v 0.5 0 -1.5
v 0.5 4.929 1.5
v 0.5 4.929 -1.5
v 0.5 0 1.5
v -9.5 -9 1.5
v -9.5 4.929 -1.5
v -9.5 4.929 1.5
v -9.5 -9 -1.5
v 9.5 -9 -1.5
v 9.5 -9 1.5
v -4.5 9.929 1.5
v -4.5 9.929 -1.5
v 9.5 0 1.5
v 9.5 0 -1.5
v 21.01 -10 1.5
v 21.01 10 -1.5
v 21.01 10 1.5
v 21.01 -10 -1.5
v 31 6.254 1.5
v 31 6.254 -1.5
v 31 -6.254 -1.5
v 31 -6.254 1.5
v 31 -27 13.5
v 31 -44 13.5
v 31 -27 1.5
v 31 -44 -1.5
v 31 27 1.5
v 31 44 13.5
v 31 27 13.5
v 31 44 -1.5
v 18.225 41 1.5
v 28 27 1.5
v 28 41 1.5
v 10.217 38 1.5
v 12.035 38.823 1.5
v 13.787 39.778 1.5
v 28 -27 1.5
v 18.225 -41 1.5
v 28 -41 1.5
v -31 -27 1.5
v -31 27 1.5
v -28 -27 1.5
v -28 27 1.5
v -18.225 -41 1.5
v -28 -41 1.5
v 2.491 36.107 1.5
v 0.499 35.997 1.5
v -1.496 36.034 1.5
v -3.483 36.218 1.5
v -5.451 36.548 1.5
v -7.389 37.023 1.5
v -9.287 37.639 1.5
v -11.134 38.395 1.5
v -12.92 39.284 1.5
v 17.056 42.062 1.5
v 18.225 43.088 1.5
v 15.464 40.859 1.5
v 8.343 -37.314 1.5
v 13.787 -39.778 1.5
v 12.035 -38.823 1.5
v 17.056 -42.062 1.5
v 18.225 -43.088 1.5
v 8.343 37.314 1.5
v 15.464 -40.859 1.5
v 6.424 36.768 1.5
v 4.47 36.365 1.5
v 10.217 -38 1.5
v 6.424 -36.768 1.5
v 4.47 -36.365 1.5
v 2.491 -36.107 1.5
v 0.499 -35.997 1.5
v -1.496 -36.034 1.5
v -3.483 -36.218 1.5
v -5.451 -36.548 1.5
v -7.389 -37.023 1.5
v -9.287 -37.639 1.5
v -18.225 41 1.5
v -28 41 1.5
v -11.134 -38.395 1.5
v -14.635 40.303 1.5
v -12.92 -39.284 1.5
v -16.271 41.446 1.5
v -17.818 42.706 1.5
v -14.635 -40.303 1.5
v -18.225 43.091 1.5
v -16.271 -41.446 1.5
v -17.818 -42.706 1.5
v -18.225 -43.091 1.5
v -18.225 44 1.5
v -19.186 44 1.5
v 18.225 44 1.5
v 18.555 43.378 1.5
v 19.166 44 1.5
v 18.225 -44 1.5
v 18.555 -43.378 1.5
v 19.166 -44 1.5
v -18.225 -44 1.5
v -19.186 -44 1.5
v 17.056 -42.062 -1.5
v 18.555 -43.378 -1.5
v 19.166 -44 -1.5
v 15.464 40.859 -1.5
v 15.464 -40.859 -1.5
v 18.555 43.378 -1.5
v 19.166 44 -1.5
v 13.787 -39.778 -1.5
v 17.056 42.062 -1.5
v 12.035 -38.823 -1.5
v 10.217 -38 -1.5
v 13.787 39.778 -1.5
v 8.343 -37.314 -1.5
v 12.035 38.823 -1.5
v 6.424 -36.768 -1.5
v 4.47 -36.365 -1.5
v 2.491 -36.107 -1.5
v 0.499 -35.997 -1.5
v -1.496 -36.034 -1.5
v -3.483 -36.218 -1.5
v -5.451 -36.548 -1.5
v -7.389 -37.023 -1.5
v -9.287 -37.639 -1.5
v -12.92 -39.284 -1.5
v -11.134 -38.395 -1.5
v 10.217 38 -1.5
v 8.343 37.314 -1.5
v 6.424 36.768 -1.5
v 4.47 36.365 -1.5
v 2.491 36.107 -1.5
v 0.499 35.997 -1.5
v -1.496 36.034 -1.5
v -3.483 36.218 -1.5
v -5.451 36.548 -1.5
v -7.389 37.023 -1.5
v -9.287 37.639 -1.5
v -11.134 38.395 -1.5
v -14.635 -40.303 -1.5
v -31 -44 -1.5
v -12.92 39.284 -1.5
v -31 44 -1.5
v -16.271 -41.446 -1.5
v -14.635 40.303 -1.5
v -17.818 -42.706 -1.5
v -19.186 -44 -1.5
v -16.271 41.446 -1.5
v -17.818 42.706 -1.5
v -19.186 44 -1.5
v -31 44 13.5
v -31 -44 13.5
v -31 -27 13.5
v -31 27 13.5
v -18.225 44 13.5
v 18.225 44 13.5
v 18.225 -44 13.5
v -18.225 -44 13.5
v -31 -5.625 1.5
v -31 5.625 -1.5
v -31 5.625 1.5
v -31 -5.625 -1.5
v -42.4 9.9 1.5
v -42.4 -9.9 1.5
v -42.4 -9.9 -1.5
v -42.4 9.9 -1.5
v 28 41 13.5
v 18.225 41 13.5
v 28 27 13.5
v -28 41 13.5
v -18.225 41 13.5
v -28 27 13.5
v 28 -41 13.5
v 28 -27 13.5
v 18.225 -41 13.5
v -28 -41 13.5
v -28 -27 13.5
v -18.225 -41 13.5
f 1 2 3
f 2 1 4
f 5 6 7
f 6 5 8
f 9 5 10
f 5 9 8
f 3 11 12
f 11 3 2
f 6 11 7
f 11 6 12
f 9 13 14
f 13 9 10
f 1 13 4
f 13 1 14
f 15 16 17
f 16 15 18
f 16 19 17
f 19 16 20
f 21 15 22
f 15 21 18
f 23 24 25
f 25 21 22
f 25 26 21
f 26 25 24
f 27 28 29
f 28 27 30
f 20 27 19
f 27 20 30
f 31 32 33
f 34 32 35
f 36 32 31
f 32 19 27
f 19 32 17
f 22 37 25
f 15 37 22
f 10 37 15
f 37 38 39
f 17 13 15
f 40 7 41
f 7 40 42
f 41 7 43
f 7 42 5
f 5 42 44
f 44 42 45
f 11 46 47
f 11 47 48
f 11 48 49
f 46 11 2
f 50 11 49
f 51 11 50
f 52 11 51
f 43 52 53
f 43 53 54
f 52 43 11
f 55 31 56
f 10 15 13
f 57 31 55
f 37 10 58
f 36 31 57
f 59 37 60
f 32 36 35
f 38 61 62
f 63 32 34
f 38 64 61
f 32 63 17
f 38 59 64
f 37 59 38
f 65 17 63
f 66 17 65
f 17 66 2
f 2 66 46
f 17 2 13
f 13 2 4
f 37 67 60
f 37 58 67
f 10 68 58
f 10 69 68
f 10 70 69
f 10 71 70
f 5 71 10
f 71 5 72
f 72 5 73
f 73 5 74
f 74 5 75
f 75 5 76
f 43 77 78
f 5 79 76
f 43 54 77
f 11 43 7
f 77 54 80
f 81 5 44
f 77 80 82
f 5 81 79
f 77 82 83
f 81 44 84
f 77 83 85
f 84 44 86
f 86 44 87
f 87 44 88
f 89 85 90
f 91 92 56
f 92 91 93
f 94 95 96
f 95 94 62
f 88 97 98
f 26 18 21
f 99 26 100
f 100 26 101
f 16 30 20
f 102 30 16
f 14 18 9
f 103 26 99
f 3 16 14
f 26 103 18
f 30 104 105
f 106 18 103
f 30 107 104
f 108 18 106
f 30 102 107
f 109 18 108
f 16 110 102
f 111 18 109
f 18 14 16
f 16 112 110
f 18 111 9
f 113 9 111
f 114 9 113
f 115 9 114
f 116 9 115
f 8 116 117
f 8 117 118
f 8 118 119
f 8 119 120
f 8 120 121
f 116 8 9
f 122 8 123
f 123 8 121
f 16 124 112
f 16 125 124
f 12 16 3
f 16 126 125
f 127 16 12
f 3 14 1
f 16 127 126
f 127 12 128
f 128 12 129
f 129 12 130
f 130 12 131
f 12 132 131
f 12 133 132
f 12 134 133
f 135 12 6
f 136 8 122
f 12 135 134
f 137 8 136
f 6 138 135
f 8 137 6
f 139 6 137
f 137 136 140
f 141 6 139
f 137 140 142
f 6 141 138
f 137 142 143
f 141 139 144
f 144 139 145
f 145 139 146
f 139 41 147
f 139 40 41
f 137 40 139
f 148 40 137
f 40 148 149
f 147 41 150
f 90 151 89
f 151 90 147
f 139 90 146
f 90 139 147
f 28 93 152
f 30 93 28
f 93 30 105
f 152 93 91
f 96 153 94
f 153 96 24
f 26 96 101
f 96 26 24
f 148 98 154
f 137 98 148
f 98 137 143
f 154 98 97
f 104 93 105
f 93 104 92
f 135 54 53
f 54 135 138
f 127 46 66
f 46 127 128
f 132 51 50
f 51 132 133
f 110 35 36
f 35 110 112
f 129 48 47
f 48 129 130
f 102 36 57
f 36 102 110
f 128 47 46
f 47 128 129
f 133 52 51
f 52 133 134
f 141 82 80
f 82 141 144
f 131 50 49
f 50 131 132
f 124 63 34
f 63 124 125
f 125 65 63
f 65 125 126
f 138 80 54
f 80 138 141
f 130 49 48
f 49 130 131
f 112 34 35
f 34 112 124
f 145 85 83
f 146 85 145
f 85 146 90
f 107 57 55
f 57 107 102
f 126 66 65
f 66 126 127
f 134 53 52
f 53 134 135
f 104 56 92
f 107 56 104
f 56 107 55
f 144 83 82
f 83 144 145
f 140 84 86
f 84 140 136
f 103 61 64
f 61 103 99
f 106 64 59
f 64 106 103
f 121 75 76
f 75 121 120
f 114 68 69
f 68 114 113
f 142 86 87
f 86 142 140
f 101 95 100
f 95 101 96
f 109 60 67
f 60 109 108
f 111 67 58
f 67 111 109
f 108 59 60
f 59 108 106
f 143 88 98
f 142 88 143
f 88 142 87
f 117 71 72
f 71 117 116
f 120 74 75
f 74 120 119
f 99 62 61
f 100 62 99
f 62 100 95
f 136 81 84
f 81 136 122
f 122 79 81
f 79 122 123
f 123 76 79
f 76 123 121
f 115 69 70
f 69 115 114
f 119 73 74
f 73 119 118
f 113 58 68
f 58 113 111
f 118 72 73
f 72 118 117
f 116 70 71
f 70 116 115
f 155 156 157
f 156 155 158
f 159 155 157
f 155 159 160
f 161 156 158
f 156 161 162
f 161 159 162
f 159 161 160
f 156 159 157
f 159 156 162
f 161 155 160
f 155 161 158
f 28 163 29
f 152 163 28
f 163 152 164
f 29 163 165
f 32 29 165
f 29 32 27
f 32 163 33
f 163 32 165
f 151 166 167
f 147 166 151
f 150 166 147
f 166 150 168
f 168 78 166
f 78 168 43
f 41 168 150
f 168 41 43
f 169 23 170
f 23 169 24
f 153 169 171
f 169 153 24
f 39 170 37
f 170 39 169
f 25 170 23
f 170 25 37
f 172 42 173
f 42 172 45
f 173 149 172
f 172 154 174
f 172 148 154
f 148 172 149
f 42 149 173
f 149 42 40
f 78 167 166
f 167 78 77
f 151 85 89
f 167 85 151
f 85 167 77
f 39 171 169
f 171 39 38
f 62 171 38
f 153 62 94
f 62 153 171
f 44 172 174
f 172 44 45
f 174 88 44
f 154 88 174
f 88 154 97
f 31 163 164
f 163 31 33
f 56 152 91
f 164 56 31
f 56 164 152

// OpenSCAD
//Settlers game card holder
// 1 to 1 copy of previous blender version but with parameters for changeing dimention

//Constants
// Card short side in mm (Default settlers card 54mm)
card_x = 54;

// Card long side in mm (Default settlers card 80mm)
card_y = 80;

show_logo = "yes"; // [yes,no]

connectors = "both";  // [both,none,female,male]

// Gap between card and the walls of the holder
card_space = 2; //original 2
wall_thickness = 3; //original 2
plate_height = 3; //original 2
wall_height = 12; //original 12
shortwall_cut = card_x/(card_y/card_x);
shortwall = (card_x-shortwall_cut)/2+wall_thickness+card_space/2;

//Connecting piece
//the "female" part is 21mm at the biggest point and 12.5mm at the smallest and 10mm deep
//the "male" part is  19.8mm at the biggest point and 10.46mm at smallest and 11.4mm long
//the odd numbers are because i used a manualy freehand modifed box with no real grid snapping, and some random scaling
// ignore variable values
female_con_x = 10+1-1;
female_con_y1 = 21+1-2;
female_con_y2 = 12.5+1-1;
male_con_x = 11.4+1-1;
male_con_y1 = 19.8+1-1;
male_con_y2 = 10.46+1-1;
angle = atan( ((female_con_y1-female_con_y2)/2) / female_con_x ); // same for both




union() {

	difference() {
		//Base plate
		cube(size = [card_x+card_space+wall_thickness*2, card_y+card_space+wall_thickness*2,plate_height], center = true);
		//Round Cut
		// was made with a cylinder with radius=32 scaled in x and y by 0.8, resulting in R=25.6 and that is aprox card_x
		translate([0,card_y/1.27,-card_x/4])
		cylinder(card_x/2, card_x/2, card_x/2, $fa=2);
		translate([0,-card_y/1.27,-card_x/4])
		cylinder(card_x/2, card_x/2, card_x/2, $fa=2);

		//Logo
		if (show_logo == "yes") {
			union() {
				translate([0, -4.5, 0])
				cube(size = [19,9,10], center = true);
				difference() {
					translate([-4.5, 0.5 ,0])
					cube(size = [10,19,10], center = true);
					translate([0.5, 12 ,0])
					rotate([0, 0, 45])
					cube(size = [10,12,11], center = true);
					translate([-9.5, 12 ,0])
					rotate([0, 0, 45])
					cube(size = [12,10,11], center = true);
				}
			}
		}

		//female con
		if (connectors == "both" || connectors == "female") {
			translate( [ (card_x/2) - female_con_x + card_space/2 + wall_thickness +0.01 , -female_con_y1/2, -plate_height ] ) //0.01 is for overlapping
			difference() {
				cube(size = [female_con_x, female_con_y1, plate_height*2], center = false);
				translate( [ 0,female_con_y1,-1 ] )
				rotate([0, 0, -angle])
				cube(female_con_x*2);
				translate( [ 0,0,-1 ] )
				rotate([0, 0, angle-90])
				cube(female_con_x*2);
			}
		}
	}

	//male con
	if (connectors == "both" || connectors == "male") {
		translate( [ -(card_x/2) - card_space/2 - wall_thickness - male_con_x, -male_con_y1/2, -plate_height/2 ] )
		difference() {
			cube(size = [male_con_x, male_con_y1, plate_height], center = false);
			translate( [ 0,male_con_y1,-1 ] )
			rotate([0, 0, -angle])
			cube(male_con_x*2);
			translate( [ 0,0,-1 ] )
			rotate([0, 0, angle-90])
			cube(male_con_x*2);
		}
	}

	//Cards for reference
	//%cube(size = [card_x,card_y,9], center = true);
	//%cube(size = [card_y,card_x,9], center = true);

	//%cube(size= [shortwall_cut, 100,20], center = true);

	// Long wall 1 of 4
	translate([  (card_x+card_space+wall_thickness*2)/2 , (card_y+card_space+wall_thickness*2)/2 ,plate_height/2])
	rotate([0,0,180])
	cube(size = [wall_thickness,(card_y-card_x)/2+wall_thickness+card_space/2,wall_height] ,center = false);

	// Long wall 2 of 4
	translate([  -(card_x+card_space+wall_thickness*2)/2 +wall_thickness , (card_y+card_space+wall_thickness*2)/2 ,plate_height/2])
	rotate([0,0,180])
	cube(size = [wall_thickness,(card_y-card_x)/2+wall_thickness+card_space/2,wall_height] ,center = false);

	// Long wall 3 of 4
	translate([  (card_x+card_space+wall_thickness*2)/2 -wall_thickness, -(card_y+card_space+wall_thickness*2)/2 ,plate_height/2])
	rotate([0,0,0])
	cube(size = [wall_thickness,(card_y-card_x)/2+wall_thickness+card_space/2,wall_height] ,center = false);

	// Long wall 4 of 4
	translate([  -(card_x+card_space+wall_thickness*2)/2 , -(card_y+card_space+wall_thickness*2)/2 ,plate_height/2])
	rotate([0,0,0])
	cube(size = [wall_thickness,(card_y-card_x)/2+wall_thickness+card_space/2,wall_height] ,center = false);

	//Shortwall 1 of 4
	//the cut to make the space between the walls was originaly 37mm
	translate([  -(card_x+card_space+wall_thickness*2)/2  , (card_y+card_space+wall_thickness*2)/2 ,plate_height/2])
	rotate([0,0,270])
	cube(size = [wall_thickness, shortwall , wall_height] ,center = false);

	//Shortwall 2 of 4
	//the cut to make the space between the walls was originaly 37mm
	translate([  (card_x+card_space+wall_thickness*2)/2 , -(card_y+card_space+wall_thickness*2)/2 ,plate_height/2])
	rotate([0,0,90])
	cube(size = [wall_thickness, shortwall , wall_height] ,center = false);

	//Shortwall 3 of 4
	//the cut to make the space between the walls was originaly 37mm
	translate([  -(card_x+card_space+wall_thickness*2)/2 , -(card_y+card_space+wall_thickness*2)/2 +wall_thickness ,plate_height/2])
	rotate([0,0,270])
	cube(size = [wall_thickness, shortwall , wall_height] ,center = false);

	//Shortwall 4 of 4
	//the cut to make the space between the walls was originaly 37mm
	translate([  (card_x+card_space+wall_thickness*2)/2 , (card_y+card_space+wall_thickness*2)/2 -wall_thickness ,plate_height/2])
	rotate([0,0,90])
	cube(size = [wall_thickness, shortwall , wall_height] ,center = false);


}
